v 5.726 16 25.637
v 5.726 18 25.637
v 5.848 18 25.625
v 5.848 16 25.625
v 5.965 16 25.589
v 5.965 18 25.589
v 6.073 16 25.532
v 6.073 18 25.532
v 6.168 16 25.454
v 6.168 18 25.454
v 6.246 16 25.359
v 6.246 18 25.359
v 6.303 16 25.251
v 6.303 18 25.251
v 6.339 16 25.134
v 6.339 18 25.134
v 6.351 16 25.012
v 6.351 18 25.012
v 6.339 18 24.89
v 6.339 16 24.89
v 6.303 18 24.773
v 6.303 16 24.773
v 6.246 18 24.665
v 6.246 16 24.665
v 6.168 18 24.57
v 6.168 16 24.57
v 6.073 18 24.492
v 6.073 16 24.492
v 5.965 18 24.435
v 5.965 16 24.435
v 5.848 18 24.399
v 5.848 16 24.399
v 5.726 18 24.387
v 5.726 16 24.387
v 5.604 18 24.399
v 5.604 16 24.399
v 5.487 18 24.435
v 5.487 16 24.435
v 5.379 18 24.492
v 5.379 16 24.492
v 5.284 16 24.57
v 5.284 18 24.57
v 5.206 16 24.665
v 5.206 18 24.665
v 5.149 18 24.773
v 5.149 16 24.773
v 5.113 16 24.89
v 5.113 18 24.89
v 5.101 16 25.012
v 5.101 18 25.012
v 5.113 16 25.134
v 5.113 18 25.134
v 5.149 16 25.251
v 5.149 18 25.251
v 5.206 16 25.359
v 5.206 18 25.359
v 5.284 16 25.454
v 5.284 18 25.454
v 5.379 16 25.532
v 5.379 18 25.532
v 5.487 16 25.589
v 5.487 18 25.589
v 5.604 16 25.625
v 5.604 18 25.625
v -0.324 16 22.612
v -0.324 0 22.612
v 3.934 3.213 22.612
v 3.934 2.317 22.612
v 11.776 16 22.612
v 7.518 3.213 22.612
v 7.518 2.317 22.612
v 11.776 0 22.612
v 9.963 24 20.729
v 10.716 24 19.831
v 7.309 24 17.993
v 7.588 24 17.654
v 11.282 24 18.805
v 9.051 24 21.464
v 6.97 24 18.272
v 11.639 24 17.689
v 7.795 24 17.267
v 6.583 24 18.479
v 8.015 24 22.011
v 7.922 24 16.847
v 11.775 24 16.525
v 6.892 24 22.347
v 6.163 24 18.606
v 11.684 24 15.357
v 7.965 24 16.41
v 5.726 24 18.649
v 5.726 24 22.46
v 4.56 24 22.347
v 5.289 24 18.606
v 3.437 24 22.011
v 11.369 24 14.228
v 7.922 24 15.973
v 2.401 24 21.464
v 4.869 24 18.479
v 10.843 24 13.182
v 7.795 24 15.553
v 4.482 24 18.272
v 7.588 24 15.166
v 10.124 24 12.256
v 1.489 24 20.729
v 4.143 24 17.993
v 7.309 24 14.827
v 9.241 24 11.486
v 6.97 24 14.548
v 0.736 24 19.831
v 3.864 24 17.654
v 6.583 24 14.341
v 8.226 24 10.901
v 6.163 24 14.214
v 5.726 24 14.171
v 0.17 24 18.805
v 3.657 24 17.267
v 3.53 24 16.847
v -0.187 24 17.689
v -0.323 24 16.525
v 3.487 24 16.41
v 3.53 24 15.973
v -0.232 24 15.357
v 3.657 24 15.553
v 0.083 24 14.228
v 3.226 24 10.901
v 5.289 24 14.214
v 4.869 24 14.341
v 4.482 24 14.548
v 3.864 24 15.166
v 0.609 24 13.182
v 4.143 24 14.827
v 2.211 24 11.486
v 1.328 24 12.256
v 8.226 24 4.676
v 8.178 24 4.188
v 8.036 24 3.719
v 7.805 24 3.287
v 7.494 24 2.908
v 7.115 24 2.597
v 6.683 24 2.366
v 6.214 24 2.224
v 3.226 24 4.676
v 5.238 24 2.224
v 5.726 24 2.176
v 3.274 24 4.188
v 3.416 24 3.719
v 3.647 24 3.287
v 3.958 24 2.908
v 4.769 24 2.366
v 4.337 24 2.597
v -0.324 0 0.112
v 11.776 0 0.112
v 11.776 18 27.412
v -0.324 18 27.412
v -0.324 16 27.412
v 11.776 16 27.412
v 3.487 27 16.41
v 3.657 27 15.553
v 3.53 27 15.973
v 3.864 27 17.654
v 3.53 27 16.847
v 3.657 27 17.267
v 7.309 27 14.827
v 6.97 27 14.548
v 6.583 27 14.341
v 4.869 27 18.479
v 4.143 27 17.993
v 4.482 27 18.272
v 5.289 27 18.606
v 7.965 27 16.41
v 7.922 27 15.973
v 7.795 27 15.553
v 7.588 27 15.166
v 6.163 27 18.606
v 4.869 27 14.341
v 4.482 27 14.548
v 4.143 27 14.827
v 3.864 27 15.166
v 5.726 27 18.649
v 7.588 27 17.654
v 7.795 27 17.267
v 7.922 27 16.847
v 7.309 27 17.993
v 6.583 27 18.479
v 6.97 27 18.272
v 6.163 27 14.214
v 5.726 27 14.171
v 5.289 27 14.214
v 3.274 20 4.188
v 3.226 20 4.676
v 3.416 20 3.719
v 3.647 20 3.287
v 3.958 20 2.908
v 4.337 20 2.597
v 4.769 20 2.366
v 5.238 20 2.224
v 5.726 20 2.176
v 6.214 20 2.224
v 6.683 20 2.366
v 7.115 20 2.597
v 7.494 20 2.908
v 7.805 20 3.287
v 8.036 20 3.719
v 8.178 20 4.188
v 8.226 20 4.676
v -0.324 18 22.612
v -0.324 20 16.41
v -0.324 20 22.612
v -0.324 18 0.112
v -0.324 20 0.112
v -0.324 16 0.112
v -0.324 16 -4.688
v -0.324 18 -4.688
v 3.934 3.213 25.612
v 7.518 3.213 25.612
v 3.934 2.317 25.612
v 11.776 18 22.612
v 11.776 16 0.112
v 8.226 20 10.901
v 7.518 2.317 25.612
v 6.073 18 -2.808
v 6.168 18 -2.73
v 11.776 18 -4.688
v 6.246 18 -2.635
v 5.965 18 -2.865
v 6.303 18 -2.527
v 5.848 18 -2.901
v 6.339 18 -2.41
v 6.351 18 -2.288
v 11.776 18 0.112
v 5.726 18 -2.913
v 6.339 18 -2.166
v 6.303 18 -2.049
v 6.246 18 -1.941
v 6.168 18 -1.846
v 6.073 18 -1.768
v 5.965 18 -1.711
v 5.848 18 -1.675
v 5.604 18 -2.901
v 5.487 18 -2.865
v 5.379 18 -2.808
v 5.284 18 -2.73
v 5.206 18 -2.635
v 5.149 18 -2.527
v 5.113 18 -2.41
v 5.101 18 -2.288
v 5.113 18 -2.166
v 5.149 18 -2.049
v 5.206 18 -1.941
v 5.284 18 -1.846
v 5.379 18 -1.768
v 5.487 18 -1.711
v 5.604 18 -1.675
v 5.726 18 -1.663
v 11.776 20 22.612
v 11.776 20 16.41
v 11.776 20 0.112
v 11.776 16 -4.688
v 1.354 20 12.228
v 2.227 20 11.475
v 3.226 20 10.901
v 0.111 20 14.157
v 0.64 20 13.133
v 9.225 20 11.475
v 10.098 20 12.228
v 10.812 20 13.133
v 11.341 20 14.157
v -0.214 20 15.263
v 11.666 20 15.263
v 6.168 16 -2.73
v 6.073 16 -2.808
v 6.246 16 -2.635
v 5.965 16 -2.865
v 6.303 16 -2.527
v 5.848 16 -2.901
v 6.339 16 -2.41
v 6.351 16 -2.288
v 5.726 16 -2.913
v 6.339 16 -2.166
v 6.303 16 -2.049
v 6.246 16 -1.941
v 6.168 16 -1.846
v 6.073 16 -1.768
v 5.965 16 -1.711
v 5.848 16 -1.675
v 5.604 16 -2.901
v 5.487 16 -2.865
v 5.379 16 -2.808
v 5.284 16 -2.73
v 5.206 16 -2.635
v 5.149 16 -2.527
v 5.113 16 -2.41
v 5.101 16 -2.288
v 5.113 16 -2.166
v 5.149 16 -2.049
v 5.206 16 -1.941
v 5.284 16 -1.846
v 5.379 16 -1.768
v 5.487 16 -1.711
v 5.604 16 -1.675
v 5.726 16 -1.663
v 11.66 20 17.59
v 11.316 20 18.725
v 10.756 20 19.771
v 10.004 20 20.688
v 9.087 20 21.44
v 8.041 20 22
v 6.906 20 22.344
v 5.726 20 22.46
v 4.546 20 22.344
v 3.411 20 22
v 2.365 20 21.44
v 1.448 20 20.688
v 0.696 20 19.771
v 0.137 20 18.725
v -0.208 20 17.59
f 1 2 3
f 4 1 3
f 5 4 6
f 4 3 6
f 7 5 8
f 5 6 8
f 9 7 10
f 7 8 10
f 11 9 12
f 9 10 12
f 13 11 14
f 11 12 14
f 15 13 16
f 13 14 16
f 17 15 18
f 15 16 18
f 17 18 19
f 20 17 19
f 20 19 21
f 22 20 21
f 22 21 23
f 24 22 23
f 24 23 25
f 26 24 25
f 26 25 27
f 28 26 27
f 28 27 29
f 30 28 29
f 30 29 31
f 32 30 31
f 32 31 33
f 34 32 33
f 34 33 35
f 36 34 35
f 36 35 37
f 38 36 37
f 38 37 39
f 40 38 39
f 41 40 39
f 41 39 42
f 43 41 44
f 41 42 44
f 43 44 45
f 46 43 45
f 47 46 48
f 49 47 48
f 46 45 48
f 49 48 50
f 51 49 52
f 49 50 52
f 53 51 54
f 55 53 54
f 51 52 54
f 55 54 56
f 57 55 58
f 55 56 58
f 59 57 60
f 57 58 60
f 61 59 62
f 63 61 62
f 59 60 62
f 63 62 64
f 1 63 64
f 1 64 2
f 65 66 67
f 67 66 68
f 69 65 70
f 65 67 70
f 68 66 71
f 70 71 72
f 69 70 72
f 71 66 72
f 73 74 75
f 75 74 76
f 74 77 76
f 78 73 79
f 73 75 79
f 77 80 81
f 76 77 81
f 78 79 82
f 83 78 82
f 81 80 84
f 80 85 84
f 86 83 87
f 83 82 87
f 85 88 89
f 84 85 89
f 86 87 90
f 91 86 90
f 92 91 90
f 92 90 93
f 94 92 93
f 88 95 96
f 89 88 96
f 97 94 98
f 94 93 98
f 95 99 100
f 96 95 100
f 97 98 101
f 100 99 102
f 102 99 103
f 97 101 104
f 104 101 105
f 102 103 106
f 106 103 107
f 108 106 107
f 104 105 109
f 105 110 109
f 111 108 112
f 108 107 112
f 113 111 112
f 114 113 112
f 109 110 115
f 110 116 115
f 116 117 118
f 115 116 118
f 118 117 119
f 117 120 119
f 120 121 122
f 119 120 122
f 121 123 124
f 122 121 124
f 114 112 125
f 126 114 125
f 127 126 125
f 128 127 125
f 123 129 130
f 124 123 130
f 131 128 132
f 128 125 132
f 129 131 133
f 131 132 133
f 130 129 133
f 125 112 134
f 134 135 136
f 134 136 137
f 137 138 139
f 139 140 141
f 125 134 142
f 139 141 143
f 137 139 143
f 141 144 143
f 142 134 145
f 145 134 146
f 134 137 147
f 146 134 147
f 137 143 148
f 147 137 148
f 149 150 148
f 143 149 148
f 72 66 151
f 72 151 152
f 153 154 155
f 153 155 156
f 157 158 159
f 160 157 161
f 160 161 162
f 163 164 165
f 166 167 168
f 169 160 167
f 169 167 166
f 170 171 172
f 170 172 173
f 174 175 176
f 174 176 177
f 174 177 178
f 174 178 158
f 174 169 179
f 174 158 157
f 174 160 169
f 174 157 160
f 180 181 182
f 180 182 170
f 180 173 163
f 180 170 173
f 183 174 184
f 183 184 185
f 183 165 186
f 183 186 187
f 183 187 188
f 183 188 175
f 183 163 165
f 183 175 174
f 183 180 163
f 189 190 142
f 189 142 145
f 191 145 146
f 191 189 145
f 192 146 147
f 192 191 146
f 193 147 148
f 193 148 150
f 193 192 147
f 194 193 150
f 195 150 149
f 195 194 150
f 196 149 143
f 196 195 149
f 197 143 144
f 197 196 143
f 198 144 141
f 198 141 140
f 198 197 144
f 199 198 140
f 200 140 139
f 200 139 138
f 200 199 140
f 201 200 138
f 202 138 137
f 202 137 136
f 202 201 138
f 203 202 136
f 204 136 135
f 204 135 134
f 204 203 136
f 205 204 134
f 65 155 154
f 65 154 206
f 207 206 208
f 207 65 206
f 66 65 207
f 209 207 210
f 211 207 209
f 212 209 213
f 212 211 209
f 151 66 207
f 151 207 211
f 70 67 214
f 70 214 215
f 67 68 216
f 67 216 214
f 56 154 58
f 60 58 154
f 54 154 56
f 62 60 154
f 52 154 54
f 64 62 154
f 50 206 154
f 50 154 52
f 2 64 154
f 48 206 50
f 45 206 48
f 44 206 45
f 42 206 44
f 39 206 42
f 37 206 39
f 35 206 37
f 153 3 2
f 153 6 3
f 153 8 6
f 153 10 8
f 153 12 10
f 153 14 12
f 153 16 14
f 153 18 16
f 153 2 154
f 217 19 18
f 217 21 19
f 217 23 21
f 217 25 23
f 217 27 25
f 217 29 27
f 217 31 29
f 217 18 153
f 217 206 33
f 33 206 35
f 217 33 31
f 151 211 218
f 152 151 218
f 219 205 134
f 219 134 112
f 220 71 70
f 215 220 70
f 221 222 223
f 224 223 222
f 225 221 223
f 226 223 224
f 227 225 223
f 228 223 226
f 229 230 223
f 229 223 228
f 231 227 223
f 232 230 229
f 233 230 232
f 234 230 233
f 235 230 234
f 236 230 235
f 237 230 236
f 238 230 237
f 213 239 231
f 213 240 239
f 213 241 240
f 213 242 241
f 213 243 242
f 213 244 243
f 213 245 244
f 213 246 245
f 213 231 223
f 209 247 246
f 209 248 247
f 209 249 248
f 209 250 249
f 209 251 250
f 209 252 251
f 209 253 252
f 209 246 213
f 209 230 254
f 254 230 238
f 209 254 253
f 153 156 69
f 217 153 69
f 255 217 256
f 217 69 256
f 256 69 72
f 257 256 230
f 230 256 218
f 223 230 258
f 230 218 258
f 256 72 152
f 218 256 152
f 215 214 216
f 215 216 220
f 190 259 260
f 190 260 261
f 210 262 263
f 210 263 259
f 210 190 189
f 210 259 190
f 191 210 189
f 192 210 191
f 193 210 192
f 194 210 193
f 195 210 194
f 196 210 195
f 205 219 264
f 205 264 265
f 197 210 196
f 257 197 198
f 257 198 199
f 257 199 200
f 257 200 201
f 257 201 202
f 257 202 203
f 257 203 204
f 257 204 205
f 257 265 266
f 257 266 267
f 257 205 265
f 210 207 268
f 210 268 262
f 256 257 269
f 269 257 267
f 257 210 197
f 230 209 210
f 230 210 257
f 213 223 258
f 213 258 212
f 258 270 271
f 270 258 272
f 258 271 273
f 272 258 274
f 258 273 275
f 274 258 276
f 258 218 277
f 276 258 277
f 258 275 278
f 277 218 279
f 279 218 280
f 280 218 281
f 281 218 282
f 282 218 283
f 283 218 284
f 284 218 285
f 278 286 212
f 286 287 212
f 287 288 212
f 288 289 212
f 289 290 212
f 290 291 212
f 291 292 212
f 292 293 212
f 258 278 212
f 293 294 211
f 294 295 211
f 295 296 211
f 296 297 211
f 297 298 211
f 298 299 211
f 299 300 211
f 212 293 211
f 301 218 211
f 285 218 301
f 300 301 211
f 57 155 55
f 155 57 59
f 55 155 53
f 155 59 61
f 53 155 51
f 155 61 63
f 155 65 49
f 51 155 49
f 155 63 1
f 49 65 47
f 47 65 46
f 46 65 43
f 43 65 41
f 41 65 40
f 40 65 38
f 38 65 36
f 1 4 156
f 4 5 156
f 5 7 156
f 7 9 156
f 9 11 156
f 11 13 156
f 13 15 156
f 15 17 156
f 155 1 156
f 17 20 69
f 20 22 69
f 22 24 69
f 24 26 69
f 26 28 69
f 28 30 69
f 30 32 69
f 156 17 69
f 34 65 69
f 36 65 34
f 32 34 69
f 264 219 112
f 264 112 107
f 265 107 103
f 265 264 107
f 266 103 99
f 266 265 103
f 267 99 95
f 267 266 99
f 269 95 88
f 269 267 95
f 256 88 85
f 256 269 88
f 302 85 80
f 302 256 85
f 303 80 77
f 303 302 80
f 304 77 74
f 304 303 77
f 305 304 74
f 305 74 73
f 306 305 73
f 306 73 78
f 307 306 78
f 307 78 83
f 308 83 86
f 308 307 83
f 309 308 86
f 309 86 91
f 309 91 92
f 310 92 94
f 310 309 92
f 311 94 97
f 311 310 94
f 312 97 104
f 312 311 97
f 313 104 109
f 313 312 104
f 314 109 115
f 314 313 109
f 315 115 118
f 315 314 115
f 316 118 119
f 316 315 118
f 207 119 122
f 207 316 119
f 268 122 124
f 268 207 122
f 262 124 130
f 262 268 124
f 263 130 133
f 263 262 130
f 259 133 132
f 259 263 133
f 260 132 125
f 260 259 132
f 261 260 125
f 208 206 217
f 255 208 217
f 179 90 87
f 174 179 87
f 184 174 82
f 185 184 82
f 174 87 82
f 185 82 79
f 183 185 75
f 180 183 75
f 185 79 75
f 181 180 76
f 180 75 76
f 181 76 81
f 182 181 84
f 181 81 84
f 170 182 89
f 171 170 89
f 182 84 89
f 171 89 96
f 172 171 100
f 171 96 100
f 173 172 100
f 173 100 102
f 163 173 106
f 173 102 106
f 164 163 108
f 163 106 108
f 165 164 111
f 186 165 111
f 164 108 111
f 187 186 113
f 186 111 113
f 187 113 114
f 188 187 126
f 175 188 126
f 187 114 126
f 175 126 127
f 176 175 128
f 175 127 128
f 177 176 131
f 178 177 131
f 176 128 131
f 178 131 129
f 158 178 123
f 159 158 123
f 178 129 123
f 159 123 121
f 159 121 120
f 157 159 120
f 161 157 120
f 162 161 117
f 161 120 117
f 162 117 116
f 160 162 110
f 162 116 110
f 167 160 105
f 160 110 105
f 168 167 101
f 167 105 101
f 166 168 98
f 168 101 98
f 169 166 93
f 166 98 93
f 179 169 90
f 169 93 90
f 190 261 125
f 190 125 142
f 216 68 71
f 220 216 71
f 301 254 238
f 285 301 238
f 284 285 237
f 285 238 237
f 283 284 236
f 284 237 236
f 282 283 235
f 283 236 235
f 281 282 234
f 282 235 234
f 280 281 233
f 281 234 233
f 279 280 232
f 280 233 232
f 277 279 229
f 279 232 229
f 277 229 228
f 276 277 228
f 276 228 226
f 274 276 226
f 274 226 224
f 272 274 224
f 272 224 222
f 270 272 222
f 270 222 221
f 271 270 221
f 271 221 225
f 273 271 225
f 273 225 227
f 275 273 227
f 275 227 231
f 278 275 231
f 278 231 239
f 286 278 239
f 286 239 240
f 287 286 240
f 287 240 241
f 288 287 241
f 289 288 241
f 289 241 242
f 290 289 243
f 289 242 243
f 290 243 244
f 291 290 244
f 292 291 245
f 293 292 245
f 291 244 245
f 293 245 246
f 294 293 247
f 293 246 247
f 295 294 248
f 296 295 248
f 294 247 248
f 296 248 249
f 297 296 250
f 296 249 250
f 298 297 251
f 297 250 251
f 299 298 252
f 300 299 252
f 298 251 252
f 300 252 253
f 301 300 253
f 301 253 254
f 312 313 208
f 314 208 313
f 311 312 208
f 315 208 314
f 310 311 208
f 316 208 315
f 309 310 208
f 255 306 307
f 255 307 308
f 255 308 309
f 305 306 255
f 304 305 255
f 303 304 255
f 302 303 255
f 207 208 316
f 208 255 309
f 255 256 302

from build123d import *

# Parameters (mm, degrees)
SKETCH_1_W          = 12.1
SKETCH_1_H          = 22.5
EXTRUDE_1_DEPTH     = 20
SKETCH_2_W          = 12.1
SKETCH_2_H          = 2
EXTRUDE_2_DEPTH     = 4.8
SKETCH_3_W          = 12.1
SKETCH_3_H          = 2
EXTRUDE_3_DEPTH     = 4.8
SKETCH_4_R          = 0.625
CUT_EXTRUDE_1_DEPTH = 35.843819526
EXTRUDE_4_DEPTH     = 4
SKETCH_6_R          = 2.239241923
EXTRUDE_5_DEPTH     = 3
SKETCH_7_W          = 3.584102009
SKETCH_7_H          = 0.896025503
EXTRUDE_6_DEPTH     = 3


with BuildPart() as part:
    # 草图1 → 凸台-拉伸1 (new body)
    with BuildSketch(Plane(origin=(0, 0, 0), x_dir=(1, 0, 0), z_dir=(0, 1, 0))):
        with Locations((5.726041667, -11.361979167)):
            Rectangle(SKETCH_1_W, SKETCH_1_H)
    extrude(amount=EXTRUDE_1_DEPTH)

    # 草图2 → 凸台-拉伸2 (add)
    with BuildSketch(Plane.XY.offset(22.611979167)):
        with Locations((5.726041667, 17)):
            Rectangle(SKETCH_2_W, SKETCH_2_H)
    extrude(amount=EXTRUDE_2_DEPTH)

    # 草图3 → 凸台-拉伸3 (add)
    with BuildSketch(Plane(origin=(0, 0, 0.111979167), x_dir=(-1, 0, 0), z_dir=(0, 0, -1))):
        with Locations((-5.726041667, 17)):
            Rectangle(SKETCH_3_W, SKETCH_3_H)
    extrude(amount=EXTRUDE_3_DEPTH)

    # 草图4 → 切除-拉伸1 (cut, through all)
    with BuildSketch(Plane(origin=(0, 18, 0), x_dir=(1, 0, 0), z_dir=(0, 1, 0))):
        with Locations(Location((5.726041667, 2.288020833, 0), (0, 0, 270))):
            Circle(SKETCH_4_R)
        with Locations(Location((5.726041667, -25.011979167, 0), (0, 0, 270))):
            Circle(SKETCH_4_R)
    extrude(amount=-CUT_EXTRUDE_1_DEPTH, mode=Mode.SUBTRACT)

    # 草图5 → 凸台-拉伸4 (add)
    with BuildSketch(Plane(origin=(0, 20, 0), x_dir=(1, 0, 0), z_dir=(0, 1, 0))):
        with BuildLine():
            Line((8.226041667, -4.676017513), (8.226041667, -10.900780437))
            ThreePointArc((8.226041667, -10.900780437), (5.726041667, -22.460090739), (3.226041667, -10.900780437))
            Line((3.226041667, -10.900780437), (3.226041667, -4.676017412))
            ThreePointArc((3.226041667, -4.676017412), (5.726041717, -2.176017463), (8.226041667, -4.676017513))
        make_face()
    extrude(amount=EXTRUDE_4_DEPTH)

    # 草图6 → 凸台-拉伸5 (add)
    with BuildSketch(Plane(origin=(0, 24, 0), x_dir=(1, 0, 0), z_dir=(0, 1, 0))):
        with Locations(Location((5.726041667, -16.410090739, 0), (0, 0, 270))):
            Circle(SKETCH_6_R)
    extrude(amount=EXTRUDE_5_DEPTH)

    # 草图7 → 凸台-拉伸6 (add)
    with BuildSketch(Plane.XY.offset(22.611979167)):
        with Locations((5.726041667, 2.764925233)):
            Rectangle(SKETCH_7_W, SKETCH_7_H)
    extrude(amount=EXTRUDE_6_DEPTH)


solid = part.part
